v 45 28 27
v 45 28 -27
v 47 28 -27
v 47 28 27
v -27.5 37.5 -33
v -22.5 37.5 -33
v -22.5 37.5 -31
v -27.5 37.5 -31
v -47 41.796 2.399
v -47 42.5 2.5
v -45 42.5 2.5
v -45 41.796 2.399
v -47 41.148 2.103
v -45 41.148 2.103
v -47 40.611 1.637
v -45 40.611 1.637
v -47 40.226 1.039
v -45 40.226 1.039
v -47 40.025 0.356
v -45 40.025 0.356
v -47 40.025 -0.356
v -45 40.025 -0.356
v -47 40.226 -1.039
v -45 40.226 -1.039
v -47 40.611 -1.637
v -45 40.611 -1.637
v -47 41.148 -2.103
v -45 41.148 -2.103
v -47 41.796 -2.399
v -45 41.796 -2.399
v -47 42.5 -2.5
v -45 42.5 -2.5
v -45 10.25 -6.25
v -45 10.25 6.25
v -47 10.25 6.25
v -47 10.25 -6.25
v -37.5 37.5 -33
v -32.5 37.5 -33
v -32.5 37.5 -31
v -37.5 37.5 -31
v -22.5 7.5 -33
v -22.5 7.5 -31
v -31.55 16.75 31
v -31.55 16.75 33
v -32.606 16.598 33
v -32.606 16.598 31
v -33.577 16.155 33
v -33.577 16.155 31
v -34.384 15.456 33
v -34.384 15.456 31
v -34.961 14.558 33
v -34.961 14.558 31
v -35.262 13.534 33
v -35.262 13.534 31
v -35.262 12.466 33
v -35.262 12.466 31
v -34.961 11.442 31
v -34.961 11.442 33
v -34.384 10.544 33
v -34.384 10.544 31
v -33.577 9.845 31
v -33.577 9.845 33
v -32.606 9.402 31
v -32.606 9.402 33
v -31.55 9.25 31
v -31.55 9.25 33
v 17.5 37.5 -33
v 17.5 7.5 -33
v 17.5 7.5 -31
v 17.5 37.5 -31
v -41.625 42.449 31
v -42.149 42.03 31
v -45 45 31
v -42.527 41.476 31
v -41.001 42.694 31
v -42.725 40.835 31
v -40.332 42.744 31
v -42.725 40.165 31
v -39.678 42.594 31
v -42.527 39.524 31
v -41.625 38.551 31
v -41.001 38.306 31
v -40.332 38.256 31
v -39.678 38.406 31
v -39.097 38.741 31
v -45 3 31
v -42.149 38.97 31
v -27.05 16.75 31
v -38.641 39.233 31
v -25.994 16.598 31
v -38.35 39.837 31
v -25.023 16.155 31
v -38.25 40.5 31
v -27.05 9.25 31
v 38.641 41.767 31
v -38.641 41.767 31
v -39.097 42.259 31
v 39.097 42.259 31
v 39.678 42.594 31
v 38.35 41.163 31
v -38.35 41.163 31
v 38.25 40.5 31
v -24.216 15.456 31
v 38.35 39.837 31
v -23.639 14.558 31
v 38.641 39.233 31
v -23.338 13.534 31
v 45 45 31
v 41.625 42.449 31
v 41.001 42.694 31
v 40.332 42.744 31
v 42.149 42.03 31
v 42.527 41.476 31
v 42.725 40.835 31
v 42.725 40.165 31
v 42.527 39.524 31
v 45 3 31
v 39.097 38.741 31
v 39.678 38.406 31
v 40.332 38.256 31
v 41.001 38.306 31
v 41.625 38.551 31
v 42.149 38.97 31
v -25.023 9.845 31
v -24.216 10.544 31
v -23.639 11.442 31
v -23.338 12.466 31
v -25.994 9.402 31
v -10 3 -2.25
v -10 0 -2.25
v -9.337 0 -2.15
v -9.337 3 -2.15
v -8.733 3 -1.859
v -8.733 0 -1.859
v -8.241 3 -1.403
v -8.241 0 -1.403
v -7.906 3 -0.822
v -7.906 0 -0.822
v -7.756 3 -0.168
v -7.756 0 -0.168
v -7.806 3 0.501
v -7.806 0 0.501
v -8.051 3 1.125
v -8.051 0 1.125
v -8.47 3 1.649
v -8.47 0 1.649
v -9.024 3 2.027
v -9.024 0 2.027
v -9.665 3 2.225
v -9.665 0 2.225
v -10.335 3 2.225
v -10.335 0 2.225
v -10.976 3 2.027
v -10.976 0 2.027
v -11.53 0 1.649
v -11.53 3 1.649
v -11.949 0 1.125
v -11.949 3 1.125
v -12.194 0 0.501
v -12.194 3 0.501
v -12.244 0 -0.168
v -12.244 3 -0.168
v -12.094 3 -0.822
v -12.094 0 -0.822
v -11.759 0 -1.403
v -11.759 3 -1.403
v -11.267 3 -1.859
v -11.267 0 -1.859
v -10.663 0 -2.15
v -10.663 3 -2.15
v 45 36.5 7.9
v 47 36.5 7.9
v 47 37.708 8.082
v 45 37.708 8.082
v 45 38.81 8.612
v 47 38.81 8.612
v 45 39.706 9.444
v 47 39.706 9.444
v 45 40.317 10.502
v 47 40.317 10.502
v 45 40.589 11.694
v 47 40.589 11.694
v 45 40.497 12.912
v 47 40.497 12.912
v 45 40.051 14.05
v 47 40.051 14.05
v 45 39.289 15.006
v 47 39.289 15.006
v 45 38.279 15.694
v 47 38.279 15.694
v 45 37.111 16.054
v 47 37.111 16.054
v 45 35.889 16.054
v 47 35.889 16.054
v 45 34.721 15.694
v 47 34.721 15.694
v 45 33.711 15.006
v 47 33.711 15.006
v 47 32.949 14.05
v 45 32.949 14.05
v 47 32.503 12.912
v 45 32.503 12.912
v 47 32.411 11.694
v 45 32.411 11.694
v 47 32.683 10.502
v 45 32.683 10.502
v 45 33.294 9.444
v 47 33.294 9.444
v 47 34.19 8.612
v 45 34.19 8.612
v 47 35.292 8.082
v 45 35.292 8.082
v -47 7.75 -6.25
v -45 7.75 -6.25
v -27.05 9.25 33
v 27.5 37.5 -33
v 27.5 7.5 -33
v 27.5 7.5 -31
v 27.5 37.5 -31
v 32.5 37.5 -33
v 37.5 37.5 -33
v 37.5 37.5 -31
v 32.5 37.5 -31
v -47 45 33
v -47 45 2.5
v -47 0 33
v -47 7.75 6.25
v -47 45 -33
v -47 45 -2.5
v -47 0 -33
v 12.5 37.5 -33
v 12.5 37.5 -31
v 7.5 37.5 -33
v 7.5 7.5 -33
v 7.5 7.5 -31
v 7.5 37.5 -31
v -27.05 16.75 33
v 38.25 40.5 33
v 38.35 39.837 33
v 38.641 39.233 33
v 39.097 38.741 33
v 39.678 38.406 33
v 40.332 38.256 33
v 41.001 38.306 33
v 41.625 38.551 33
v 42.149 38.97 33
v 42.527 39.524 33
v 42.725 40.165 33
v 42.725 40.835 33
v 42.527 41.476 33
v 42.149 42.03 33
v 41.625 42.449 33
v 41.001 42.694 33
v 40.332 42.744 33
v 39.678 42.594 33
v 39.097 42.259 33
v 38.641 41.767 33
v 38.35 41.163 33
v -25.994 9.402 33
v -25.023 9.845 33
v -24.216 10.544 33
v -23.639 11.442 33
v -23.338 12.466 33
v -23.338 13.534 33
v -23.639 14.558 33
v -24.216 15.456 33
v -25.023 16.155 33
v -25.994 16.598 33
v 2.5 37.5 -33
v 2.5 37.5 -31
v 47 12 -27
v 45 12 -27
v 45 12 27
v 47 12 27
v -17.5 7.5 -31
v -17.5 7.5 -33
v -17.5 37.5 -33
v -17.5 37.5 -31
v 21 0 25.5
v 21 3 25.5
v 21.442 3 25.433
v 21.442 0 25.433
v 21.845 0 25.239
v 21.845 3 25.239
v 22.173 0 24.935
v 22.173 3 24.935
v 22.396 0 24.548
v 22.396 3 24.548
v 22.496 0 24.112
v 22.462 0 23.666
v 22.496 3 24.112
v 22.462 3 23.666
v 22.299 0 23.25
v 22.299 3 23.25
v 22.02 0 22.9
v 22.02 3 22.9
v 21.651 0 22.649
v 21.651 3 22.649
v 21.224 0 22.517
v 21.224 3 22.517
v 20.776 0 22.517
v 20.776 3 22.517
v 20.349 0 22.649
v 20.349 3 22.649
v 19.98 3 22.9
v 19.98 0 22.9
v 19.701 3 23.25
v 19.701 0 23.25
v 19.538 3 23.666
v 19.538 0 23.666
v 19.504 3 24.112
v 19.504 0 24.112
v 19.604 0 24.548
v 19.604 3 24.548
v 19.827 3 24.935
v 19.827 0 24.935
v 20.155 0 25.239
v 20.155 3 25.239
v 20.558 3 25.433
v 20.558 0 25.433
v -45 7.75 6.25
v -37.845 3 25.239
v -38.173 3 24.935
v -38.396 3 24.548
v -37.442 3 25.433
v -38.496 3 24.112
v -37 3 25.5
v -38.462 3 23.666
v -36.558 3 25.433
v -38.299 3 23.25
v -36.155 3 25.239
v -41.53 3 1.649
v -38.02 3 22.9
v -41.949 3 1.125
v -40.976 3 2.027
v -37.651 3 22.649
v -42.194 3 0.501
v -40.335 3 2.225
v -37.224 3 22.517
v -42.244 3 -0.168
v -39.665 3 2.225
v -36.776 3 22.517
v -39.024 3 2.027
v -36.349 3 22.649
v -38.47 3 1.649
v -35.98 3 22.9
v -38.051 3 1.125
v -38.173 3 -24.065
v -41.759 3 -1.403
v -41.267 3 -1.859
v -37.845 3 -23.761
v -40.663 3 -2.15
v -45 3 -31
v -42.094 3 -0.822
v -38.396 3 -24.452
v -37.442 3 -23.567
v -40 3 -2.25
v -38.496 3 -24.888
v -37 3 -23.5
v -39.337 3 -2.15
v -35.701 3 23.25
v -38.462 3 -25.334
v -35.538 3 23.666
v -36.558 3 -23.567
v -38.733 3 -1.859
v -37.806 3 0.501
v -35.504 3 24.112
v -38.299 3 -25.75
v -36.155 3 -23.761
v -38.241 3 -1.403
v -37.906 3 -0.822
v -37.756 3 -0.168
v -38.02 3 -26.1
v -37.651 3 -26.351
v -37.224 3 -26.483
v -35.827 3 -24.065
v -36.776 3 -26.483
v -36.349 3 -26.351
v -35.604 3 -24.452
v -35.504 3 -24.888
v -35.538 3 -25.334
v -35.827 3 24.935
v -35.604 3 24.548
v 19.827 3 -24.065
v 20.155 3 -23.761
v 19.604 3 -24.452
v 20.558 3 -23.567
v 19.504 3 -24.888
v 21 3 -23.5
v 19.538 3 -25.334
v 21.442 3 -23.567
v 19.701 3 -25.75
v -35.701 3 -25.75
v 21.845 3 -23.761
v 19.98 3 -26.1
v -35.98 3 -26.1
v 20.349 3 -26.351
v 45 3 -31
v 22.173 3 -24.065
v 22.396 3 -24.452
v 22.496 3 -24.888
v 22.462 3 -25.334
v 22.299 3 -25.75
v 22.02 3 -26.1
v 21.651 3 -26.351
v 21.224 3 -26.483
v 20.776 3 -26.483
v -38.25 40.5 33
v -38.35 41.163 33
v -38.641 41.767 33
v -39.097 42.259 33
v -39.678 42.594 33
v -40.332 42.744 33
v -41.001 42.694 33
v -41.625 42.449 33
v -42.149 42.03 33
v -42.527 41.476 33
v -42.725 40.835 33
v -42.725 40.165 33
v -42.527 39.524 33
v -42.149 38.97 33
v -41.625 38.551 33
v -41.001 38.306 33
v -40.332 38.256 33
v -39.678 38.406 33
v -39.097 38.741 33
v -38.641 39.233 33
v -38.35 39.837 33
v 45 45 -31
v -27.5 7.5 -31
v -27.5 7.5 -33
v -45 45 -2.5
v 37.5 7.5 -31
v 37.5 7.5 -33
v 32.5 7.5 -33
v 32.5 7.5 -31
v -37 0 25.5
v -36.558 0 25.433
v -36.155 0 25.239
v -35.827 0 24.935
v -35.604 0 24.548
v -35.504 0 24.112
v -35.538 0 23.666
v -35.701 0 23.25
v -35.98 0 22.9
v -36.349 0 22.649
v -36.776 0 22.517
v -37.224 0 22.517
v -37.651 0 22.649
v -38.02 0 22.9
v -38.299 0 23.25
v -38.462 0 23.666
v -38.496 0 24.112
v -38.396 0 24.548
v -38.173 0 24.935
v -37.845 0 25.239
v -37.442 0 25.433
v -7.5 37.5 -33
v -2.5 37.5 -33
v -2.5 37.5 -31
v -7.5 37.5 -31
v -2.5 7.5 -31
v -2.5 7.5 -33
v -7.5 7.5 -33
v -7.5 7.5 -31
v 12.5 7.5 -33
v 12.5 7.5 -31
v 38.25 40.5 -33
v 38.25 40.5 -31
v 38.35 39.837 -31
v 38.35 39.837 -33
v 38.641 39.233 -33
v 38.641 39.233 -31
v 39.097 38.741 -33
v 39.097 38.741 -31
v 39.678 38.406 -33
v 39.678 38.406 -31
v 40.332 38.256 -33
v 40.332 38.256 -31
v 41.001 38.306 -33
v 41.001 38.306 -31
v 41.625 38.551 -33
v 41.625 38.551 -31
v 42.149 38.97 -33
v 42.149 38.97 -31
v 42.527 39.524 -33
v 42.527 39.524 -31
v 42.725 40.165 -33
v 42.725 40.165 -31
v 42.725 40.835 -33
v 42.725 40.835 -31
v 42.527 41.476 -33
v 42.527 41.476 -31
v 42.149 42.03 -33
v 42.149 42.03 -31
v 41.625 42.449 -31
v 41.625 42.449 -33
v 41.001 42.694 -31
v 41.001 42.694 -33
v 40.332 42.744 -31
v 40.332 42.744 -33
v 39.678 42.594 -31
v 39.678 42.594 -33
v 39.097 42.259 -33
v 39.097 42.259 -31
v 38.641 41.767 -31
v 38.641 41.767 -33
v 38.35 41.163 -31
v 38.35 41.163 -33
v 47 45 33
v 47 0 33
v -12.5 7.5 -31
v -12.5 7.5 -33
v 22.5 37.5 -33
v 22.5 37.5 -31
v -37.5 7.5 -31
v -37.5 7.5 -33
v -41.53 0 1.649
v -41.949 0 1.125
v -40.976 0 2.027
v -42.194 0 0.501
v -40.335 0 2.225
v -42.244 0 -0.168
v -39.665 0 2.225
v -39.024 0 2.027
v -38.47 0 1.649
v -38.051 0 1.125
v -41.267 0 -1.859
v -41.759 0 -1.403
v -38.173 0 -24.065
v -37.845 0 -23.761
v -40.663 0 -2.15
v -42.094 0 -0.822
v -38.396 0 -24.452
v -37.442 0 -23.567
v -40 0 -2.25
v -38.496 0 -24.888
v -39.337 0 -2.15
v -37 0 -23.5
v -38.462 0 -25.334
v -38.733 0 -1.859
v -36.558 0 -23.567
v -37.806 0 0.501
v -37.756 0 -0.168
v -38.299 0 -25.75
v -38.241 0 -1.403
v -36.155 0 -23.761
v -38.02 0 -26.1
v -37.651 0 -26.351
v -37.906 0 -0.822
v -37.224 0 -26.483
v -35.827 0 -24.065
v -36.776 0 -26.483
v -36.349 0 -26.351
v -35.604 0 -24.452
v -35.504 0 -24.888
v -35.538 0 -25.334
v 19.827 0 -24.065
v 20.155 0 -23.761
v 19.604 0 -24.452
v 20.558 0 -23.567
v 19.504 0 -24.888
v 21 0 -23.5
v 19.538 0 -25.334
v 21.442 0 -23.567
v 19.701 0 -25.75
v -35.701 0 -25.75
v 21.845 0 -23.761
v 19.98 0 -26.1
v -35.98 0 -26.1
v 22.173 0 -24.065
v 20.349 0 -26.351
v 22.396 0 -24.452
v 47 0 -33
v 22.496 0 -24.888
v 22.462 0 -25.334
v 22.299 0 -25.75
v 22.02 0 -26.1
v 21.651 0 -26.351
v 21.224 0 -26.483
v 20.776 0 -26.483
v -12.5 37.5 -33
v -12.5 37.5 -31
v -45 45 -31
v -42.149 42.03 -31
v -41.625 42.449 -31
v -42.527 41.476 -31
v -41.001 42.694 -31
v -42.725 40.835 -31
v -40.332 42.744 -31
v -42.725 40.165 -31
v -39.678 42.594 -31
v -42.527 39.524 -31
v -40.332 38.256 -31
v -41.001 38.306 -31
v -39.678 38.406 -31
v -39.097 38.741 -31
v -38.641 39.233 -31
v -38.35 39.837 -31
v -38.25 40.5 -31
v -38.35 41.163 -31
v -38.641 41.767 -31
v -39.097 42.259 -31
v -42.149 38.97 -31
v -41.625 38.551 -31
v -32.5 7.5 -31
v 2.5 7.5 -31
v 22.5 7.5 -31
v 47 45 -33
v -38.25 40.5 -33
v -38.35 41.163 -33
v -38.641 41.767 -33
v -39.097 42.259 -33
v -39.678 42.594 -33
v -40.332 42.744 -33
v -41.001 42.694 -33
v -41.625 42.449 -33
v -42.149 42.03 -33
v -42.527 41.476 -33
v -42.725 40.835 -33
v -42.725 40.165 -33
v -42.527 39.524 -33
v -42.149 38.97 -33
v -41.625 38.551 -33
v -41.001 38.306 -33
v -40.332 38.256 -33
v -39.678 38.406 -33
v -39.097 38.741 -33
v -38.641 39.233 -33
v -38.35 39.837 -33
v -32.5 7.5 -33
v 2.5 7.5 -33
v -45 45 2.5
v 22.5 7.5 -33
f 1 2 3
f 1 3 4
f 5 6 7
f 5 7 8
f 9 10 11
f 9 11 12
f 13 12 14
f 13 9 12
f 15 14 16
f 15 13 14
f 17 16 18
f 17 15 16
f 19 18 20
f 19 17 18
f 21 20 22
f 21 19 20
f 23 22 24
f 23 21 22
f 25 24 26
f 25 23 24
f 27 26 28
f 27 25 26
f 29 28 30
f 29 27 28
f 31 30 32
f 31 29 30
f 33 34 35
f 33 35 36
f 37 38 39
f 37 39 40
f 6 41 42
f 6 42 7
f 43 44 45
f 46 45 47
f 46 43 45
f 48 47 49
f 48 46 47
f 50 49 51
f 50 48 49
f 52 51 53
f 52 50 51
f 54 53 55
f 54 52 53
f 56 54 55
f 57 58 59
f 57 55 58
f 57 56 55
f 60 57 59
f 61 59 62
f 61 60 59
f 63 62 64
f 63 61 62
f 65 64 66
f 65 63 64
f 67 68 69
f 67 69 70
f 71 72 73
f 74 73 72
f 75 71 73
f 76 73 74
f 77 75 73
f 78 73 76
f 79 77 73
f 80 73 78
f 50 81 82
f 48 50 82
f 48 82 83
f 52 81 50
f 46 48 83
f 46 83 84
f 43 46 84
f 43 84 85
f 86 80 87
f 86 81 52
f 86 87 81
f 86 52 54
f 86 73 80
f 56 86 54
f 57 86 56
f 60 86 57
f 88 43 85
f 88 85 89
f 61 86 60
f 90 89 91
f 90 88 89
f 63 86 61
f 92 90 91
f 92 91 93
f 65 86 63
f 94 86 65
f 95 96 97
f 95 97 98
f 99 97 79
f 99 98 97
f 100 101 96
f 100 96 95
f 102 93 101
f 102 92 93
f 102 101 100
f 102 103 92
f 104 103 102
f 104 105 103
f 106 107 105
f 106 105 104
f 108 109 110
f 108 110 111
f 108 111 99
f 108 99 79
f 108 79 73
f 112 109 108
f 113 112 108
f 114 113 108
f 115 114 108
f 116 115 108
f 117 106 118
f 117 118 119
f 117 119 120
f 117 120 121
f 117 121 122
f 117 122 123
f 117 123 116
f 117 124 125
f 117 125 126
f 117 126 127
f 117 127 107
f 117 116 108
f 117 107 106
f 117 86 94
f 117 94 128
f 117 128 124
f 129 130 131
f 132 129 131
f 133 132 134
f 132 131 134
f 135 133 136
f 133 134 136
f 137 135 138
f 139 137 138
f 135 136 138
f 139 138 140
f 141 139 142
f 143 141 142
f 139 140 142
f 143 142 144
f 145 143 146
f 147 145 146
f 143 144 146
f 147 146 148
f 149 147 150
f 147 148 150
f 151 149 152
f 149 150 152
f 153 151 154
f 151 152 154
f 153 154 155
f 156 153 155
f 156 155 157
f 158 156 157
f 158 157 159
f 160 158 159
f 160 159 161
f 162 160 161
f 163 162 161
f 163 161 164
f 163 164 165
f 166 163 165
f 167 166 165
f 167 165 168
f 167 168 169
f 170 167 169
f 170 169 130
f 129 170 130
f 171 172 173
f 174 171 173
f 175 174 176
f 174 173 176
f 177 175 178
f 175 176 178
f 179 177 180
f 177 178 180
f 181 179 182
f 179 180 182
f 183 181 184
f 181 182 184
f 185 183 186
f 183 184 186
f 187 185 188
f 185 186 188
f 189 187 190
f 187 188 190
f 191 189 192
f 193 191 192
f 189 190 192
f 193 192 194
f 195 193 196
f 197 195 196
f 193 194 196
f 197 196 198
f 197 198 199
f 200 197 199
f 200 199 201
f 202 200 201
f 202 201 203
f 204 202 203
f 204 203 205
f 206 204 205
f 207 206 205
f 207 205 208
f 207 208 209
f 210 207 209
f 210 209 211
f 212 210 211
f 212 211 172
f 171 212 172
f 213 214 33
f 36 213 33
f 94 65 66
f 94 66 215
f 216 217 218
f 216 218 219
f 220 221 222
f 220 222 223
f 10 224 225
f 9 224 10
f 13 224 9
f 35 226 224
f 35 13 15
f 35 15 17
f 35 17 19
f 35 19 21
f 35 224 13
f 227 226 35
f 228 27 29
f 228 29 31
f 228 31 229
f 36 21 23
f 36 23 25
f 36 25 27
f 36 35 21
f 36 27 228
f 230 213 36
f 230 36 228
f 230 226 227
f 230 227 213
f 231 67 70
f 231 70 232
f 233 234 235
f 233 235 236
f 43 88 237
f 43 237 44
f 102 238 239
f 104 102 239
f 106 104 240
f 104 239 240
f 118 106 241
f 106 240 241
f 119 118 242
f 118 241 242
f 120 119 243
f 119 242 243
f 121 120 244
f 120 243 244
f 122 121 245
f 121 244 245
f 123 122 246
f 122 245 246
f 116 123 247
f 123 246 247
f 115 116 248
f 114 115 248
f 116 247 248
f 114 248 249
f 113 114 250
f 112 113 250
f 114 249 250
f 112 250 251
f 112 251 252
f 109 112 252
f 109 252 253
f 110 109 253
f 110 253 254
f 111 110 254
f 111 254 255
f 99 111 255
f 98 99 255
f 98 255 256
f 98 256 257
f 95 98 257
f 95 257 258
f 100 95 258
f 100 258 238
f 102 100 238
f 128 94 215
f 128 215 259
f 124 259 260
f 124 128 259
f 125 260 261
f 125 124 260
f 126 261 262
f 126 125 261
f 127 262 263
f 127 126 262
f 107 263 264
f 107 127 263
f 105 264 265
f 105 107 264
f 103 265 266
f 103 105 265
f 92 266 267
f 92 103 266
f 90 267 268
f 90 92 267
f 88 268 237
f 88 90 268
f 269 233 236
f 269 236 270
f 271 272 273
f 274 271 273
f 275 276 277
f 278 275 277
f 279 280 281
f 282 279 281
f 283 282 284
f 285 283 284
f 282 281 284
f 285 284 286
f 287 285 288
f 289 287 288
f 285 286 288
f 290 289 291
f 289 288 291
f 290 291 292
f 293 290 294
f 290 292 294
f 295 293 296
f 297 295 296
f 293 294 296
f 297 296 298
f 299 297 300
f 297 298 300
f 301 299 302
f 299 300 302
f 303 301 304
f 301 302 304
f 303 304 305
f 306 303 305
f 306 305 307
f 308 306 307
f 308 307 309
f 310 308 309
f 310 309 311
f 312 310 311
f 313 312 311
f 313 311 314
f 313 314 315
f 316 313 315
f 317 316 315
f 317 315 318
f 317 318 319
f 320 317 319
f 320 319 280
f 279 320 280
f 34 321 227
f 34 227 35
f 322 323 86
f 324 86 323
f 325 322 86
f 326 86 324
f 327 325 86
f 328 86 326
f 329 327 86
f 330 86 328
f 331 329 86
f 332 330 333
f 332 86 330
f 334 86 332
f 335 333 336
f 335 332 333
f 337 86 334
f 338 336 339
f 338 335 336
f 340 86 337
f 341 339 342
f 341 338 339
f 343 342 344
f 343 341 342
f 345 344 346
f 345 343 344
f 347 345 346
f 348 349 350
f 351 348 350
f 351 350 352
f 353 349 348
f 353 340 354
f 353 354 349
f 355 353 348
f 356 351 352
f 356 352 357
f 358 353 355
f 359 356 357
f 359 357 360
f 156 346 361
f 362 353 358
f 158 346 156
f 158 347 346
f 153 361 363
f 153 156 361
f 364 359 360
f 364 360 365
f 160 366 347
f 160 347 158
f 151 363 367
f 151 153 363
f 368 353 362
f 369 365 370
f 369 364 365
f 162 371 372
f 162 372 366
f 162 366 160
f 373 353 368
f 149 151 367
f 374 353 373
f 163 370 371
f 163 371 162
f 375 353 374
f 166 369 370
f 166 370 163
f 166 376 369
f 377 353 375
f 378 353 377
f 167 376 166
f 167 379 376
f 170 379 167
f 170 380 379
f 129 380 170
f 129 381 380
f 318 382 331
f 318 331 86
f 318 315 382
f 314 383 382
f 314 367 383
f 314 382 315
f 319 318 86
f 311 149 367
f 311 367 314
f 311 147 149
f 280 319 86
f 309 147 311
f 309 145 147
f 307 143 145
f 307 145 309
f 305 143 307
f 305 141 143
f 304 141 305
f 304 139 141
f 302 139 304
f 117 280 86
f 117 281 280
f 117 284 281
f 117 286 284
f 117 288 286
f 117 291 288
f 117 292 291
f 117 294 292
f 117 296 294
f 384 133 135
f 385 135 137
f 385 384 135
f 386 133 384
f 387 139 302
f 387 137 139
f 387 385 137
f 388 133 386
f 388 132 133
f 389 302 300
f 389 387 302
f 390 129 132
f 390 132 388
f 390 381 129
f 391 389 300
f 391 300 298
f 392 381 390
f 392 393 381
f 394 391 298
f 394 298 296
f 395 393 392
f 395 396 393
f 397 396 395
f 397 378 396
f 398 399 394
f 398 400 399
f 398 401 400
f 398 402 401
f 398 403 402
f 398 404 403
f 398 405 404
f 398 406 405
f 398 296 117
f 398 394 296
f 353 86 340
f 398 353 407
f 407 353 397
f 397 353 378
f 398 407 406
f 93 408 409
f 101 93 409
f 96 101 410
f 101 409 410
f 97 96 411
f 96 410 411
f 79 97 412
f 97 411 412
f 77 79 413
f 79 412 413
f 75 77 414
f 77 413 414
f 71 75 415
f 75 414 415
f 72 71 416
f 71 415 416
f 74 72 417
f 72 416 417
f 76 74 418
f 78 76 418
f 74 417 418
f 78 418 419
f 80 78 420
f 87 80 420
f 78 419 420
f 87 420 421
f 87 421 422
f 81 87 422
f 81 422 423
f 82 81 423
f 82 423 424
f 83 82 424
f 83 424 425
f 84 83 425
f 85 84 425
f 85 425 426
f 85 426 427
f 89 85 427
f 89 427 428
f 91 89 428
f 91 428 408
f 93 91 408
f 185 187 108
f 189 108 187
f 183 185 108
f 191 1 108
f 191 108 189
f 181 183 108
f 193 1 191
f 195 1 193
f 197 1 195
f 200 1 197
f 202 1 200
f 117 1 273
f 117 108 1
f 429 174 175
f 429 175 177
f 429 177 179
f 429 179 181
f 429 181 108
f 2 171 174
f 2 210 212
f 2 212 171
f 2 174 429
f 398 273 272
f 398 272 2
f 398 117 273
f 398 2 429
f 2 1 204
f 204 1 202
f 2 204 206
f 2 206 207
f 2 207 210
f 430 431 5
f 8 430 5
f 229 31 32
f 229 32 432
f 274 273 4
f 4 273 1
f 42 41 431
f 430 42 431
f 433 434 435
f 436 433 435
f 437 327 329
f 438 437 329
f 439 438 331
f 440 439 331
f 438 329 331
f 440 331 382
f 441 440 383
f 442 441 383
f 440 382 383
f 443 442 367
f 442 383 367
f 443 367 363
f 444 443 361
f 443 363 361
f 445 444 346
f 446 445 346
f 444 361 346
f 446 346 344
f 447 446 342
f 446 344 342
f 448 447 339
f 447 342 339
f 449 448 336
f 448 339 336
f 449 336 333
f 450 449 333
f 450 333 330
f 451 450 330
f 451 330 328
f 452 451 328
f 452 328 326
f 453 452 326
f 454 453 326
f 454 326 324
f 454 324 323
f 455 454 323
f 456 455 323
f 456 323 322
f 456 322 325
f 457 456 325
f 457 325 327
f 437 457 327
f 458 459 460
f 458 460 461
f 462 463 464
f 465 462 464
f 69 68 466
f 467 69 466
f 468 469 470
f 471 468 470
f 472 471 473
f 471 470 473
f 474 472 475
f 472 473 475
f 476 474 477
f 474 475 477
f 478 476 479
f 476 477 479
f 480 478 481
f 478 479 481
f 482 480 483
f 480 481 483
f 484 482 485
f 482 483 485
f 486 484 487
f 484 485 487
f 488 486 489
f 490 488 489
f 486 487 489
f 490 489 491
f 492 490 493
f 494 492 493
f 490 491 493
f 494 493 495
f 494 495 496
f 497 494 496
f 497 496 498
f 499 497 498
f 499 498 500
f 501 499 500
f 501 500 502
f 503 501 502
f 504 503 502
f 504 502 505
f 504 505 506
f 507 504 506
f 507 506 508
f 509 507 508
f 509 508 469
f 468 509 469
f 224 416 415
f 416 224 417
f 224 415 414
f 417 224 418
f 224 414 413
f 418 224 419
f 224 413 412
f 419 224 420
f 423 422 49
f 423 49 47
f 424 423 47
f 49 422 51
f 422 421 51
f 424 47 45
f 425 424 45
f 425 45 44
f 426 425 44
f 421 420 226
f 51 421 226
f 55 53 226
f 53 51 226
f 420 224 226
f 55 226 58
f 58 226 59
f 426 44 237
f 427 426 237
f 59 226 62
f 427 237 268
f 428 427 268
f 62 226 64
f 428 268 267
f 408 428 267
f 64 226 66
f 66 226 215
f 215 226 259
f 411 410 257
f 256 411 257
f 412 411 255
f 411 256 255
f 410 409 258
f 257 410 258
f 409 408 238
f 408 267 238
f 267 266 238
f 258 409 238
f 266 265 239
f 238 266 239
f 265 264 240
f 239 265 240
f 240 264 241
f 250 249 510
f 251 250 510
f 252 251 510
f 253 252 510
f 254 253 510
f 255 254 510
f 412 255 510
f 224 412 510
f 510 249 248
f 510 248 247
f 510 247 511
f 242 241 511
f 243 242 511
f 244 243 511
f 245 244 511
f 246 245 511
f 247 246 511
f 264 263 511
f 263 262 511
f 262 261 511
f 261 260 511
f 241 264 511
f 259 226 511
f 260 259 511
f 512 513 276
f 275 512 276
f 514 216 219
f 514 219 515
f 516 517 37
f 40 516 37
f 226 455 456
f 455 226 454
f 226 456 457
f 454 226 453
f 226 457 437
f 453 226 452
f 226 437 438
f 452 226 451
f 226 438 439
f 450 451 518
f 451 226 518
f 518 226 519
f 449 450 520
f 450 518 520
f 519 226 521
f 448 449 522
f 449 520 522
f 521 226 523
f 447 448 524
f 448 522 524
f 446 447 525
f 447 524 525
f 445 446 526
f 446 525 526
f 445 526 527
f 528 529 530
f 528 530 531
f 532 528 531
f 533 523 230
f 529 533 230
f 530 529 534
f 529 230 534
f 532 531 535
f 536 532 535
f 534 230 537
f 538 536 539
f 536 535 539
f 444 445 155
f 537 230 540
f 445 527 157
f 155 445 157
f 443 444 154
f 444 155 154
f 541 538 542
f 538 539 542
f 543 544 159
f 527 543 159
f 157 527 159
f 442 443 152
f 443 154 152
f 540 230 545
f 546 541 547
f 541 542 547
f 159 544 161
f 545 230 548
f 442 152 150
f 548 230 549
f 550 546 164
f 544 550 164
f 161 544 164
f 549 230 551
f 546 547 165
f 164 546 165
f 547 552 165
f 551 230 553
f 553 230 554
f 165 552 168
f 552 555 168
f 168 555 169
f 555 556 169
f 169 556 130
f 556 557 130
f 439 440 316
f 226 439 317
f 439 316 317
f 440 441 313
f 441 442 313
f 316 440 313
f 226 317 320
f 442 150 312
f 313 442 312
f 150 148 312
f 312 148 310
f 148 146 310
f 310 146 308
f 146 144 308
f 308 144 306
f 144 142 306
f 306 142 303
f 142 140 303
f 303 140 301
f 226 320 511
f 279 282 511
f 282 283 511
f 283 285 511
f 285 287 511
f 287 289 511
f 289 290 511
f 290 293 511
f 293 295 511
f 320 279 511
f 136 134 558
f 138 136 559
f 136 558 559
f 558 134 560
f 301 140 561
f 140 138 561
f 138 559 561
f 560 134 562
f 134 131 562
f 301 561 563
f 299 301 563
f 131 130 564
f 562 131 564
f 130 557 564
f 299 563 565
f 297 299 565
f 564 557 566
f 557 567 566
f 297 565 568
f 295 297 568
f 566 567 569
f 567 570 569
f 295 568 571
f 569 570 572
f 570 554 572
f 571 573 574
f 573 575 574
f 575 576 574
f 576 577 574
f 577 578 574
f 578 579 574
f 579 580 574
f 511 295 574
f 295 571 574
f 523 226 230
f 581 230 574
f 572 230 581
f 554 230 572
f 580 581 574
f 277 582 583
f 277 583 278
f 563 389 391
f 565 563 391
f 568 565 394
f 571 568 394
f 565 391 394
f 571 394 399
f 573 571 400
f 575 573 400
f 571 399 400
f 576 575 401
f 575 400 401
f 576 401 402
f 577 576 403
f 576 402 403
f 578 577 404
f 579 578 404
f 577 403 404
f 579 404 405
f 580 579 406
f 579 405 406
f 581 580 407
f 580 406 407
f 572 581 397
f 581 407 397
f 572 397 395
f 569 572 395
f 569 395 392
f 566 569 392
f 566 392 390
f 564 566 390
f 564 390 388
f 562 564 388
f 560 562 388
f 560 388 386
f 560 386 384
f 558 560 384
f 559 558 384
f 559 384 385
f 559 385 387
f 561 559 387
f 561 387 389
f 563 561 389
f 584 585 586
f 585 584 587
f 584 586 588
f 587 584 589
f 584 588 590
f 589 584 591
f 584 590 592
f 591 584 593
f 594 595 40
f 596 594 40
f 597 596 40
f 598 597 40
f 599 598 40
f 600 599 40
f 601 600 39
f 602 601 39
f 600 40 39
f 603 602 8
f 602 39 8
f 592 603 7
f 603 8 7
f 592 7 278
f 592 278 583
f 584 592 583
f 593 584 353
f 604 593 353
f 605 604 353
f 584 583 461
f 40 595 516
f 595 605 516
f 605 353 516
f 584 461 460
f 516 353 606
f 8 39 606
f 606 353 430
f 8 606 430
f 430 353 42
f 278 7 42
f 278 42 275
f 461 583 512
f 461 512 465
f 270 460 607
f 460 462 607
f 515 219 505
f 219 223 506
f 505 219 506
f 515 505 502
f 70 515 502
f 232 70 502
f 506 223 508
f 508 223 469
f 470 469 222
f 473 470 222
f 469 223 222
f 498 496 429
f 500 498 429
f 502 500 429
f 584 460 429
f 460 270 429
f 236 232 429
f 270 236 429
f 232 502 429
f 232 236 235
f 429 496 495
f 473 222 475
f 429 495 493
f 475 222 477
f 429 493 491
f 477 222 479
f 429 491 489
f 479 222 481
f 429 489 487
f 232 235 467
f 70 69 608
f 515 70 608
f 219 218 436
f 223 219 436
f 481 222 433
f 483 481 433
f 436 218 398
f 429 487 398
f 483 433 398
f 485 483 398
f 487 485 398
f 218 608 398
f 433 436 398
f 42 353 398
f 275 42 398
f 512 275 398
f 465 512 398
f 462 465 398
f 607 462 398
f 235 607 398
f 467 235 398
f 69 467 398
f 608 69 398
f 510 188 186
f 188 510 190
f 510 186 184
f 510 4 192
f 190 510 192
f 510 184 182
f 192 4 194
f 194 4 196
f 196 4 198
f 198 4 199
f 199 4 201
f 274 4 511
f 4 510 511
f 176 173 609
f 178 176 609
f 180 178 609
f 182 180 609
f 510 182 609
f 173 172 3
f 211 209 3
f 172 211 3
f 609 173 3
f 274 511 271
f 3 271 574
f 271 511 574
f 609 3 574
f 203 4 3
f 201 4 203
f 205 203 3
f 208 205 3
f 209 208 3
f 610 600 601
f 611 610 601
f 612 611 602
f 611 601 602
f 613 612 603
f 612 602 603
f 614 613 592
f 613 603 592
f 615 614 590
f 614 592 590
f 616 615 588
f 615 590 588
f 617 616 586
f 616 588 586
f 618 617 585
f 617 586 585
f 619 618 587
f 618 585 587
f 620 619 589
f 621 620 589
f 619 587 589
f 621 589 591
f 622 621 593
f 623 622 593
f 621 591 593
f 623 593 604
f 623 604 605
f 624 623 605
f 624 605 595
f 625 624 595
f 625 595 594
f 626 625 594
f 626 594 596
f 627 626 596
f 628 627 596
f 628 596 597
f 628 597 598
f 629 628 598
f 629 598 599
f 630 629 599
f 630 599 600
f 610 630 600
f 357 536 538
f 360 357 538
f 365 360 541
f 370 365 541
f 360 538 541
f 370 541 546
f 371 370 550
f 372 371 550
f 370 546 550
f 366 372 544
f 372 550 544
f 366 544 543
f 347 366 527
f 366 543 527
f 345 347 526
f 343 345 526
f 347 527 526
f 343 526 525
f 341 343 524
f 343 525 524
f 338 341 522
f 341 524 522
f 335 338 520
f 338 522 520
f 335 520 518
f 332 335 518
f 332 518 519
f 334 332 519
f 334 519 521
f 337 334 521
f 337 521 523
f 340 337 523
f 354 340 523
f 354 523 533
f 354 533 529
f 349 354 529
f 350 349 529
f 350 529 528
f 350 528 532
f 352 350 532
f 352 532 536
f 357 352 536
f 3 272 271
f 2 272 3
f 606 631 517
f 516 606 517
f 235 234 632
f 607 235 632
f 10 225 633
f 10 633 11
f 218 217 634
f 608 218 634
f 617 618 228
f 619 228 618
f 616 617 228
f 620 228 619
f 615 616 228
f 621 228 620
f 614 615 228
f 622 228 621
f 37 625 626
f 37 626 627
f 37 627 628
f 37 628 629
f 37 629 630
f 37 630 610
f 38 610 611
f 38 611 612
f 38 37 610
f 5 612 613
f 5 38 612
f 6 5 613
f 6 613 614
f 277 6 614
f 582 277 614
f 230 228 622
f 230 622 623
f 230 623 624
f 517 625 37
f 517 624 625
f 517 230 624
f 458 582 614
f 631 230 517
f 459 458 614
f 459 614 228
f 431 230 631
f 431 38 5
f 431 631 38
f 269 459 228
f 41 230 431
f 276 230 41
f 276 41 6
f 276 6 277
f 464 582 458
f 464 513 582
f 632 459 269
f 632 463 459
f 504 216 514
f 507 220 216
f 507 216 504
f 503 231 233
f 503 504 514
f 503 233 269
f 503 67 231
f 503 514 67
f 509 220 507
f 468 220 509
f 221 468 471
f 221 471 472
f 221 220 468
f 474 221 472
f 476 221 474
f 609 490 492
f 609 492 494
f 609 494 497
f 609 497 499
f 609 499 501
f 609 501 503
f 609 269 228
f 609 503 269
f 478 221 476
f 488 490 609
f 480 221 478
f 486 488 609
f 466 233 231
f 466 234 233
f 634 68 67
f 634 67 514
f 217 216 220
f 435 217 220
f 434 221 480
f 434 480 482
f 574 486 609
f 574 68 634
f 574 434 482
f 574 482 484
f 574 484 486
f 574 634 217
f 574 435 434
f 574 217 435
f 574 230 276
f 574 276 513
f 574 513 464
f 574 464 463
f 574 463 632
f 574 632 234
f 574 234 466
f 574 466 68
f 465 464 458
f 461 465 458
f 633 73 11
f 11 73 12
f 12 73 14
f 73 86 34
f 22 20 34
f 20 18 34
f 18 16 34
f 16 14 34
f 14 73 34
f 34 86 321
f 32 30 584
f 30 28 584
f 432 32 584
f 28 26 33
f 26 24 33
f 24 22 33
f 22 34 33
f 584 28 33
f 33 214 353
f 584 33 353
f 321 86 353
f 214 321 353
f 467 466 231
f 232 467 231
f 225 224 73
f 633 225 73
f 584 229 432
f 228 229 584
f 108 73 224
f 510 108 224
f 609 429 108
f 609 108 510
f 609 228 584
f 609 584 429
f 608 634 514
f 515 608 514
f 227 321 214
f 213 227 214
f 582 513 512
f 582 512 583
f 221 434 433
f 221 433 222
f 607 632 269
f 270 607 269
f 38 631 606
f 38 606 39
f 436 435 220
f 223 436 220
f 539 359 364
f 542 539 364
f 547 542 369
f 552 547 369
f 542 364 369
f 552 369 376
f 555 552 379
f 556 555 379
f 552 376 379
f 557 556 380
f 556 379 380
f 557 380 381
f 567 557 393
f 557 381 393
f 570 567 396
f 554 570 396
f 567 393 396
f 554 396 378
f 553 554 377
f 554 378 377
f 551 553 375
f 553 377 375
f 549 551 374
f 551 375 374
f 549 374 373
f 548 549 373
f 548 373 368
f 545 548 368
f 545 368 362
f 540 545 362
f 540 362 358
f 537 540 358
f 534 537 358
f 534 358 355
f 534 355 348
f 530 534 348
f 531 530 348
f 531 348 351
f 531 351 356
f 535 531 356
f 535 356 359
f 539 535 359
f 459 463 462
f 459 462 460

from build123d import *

# Parameters (mm, degrees)
SKETCH1_W           = 90
SKETCH1_H           = 62
BOSS_EXTRUDE1_DEPTH = 3
CUT_EXTRUDE1_REACH  = 56.727
SKETCH2_R           = 1.5
SKETCH3_W           = 94
SKETCH3_H           = 66
SKETCH3_W_2         = 90
SKETCH3_H_2         = 62
BOSS_EXTRUDE2_DEPTH = 45
CUT_EXTRUDE2_REACH  = 109.601
SKETCH4_W           = 12.5
SKETCH4_H           = 2.5
CUT_EXTRUDE3_REACH  = 93.269
CUT_EXTRUDE4_REACH  = 109.601
SKETCH6_W           = 54
SKETCH6_H           = 16
CUT_EXTRUDE5_REACH  = 111.316
SKETCH7_R           = 4.1
SKETCH8_R           = 2.25
CUT_EXTRUDE6_DEPTH  = 93.682252886
CUT_EXTRUDE8_REACH  = 94.682
SKETCH10_W          = 5
SKETCH10_H          = 30
CUT_EXTRUDE9_REACH  = 111.316
CUT_EXTRUDE10_REACH = 74.959
SKETCH12_R          = 2.25


with BuildPart() as part:
    # Sketch1 → Boss-Extrude1 (new body)
    with BuildSketch(Plane(origin=(0, 0, 0), x_dir=(1, 0, 0), z_dir=(0, 1, 0))):
        Rectangle(SKETCH1_W, SKETCH1_H)
    extrude(amount=BOSS_EXTRUDE1_DEPTH)

    # Sketch2 → Cut-Extrude1 (cut, up to next)
    with BuildSketch(Plane(origin=(0, 3, 0), x_dir=(1, 0, 0), z_dir=(0, 1, 0)), mode=Mode.PRIVATE) as cut_extrude1_sk1:
        with Locations(Location((-37, -24, 0), (0, 0, 270))):
            Circle(SKETCH2_R)
    cut_extrude1_tool1 = extrude(cut_extrude1_sk1.sketch, amount=-CUT_EXTRUDE1_REACH, mode=Mode.PRIVATE) & part.part
    # Sketch2 → Cut-Extrude1 (cut, up to next)
    with BuildSketch(Plane(origin=(0, 3, 0), x_dir=(1, 0, 0), z_dir=(0, 1, 0)), mode=Mode.PRIVATE) as cut_extrude1_sk2:
        with Locations(Location((21, -24, 0), (0, 0, 270))):
            Circle(SKETCH2_R)
    cut_extrude1_tool2 = extrude(cut_extrude1_sk2.sketch, amount=-CUT_EXTRUDE1_REACH, mode=Mode.PRIVATE) & part.part
    # Sketch2 → Cut-Extrude1 (cut, up to next)
    with BuildSketch(Plane(origin=(0, 3, 0), x_dir=(1, 0, 0), z_dir=(0, 1, 0)), mode=Mode.PRIVATE) as cut_extrude1_sk3:
        with Locations(Location((21, 25, 0), (0, 0, 270))):
            Circle(SKETCH2_R)
    cut_extrude1_tool3 = extrude(cut_extrude1_sk3.sketch, amount=-CUT_EXTRUDE1_REACH, mode=Mode.PRIVATE) & part.part
    # Sketch2 → Cut-Extrude1 (cut, up to next)
    with BuildSketch(Plane(origin=(0, 3, 0), x_dir=(1, 0, 0), z_dir=(0, 1, 0)), mode=Mode.PRIVATE) as cut_extrude1_sk4:
        with Locations(Location((-37, 25, 0), (0, 0, 270))):
            Circle(SKETCH2_R)
    cut_extrude1_tool4 = extrude(cut_extrude1_sk4.sketch, amount=-CUT_EXTRUDE1_REACH, mode=Mode.PRIVATE) & part.part
    add(cut_extrude1_tool1.solids().sort_by_distance((-37, 3, 24))[0], mode=Mode.SUBTRACT)
    add(cut_extrude1_tool2.solids().sort_by_distance((21, 3, 24))[0], mode=Mode.SUBTRACT)
    add(cut_extrude1_tool3.solids().sort_by_distance((21, 3, -25))[0], mode=Mode.SUBTRACT)
    add(cut_extrude1_tool4.solids().sort_by_distance((-37, 3, -25))[0], mode=Mode.SUBTRACT)

    # Sketch3 → Boss-Extrude2 (add)
    with BuildSketch(Plane(origin=(0, 0, 0), x_dir=(1, 0, 0), z_dir=(0, 1, 0))):
        Rectangle(SKETCH3_W, SKETCH3_H)
        Rectangle(SKETCH3_W_2, SKETCH3_H_2, mode=Mode.SUBTRACT)
    extrude(amount=BOSS_EXTRUDE2_DEPTH)

    # Sketch4 → Cut-Extrude2 (cut, up to next)
    with BuildSketch(Plane(origin=(-45, 0, 0), x_dir=(0, 0, -1), z_dir=(1, 0, 0)), mode=Mode.PRIVATE) as cut_extrude2_sk1:
        with Locations((0, 9)):
            Rectangle(SKETCH4_W, SKETCH4_H)
    cut_extrude2_tool1 = extrude(cut_extrude2_sk1.sketch, amount=-CUT_EXTRUDE2_REACH, mode=Mode.PRIVATE) & part.part
    add(cut_extrude2_tool1.solids().sort_by_distance((-45, 9, 0))[0], mode=Mode.SUBTRACT)

    # Sketch5 → Cut-Extrude3 (cut, up to next)
    with BuildSketch(Plane(origin=(0, 0, 31), x_dir=(-1, 0, 0), z_dir=(0, 0, -1)), mode=Mode.PRIVATE) as cut_extrude3_sk1:
        with BuildLine():
            Line((31.55, 9.25), (27.05, 9.25))
            ThreePointArc((27.05, 9.25), (23.3, 13), (27.05, 16.75))
            Line((27.05, 16.75), (31.55, 16.75))
            ThreePointArc((31.55, 16.75), (35.3, 13), (31.55, 9.25))
        make_face()
    cut_extrude3_tool1 = extrude(cut_extrude3_sk1.sketch, amount=-CUT_EXTRUDE3_REACH, mode=Mode.PRIVATE) & part.part
    add(cut_extrude3_tool1.solids().sort_by_distance((-29.3, 13, 31))[0], mode=Mode.SUBTRACT)

    # Sketch6 → Cut-Extrude4 (cut, up to next)
    with BuildSketch(Plane.ZY.offset(-45), mode=Mode.PRIVATE) as cut_extrude4_sk1:
        with Locations((0, 20)):
            Rectangle(SKETCH6_W, SKETCH6_H)
    cut_extrude4_tool1 = extrude(cut_extrude4_sk1.sketch, amount=-CUT_EXTRUDE4_REACH, mode=Mode.PRIVATE) & part.part
    add(cut_extrude4_tool1.solids().sort_by_distance((45, 20, 0))[0], mode=Mode.SUBTRACT)

    # Sketch7 → Cut-Extrude5 (cut, up to next)
    with BuildSketch(Plane(origin=(47, 0, 0), x_dir=(0, 0, -1), z_dir=(1, 0, 0)), mode=Mode.PRIVATE) as cut_extrude5_sk1:
        with Locations((-12, 36.5)):
            Circle(SKETCH7_R)
    cut_extrude5_tool1 = extrude(cut_extrude5_sk1.sketch, amount=-CUT_EXTRUDE5_REACH, mode=Mode.PRIVATE) & part.part
    add(cut_extrude5_tool1.solids().sort_by_distance((47, 36.5, 12))[0], mode=Mode.SUBTRACT)

    # Sketch8 → Cut-Extrude6 (cut, through all)
    with BuildSketch(Plane.XY.offset(33)):
        with Locations((-40.5, 40.5)):
            Circle(SKETCH8_R)
        with Locations(Location((40.5, 40.5, 0), (0, 0, 180))):
            Circle(SKETCH8_R)
    extrude(amount=-CUT_EXTRUDE6_DEPTH, mode=Mode.SUBTRACT)

    # Sketch10 → Cut-Extrude8 (cut, up to next)
    with BuildSketch(Plane(origin=(0, 0, -33), x_dir=(-1, 0, 0), z_dir=(0, 0, -1)), mode=Mode.PRIVATE) as cut_extrude8_sk1:
        with Locations((15, 22.5)):
            Rectangle(SKETCH10_W, SKETCH10_H)
    cut_extrude8_tool1 = extrude(cut_extrude8_sk1.sketch, amount=-CUT_EXTRUDE8_REACH, mode=Mode.PRIVATE) & part.part
    # Sketch10 → Cut-Extrude8 (cut, up to next)
    with BuildSketch(Plane(origin=(0, 0, -33), x_dir=(-1, 0, 0), z_dir=(0, 0, -1)), mode=Mode.PRIVATE) as cut_extrude8_sk2:
        with Locations((5, 22.5)):
            Rectangle(SKETCH10_W, SKETCH10_H)
    cut_extrude8_tool2 = extrude(cut_extrude8_sk2.sketch, amount=-CUT_EXTRUDE8_REACH, mode=Mode.PRIVATE) & part.part
    # Sketch10 → Cut-Extrude8 (cut, up to next)
    with BuildSketch(Plane(origin=(0, 0, -33), x_dir=(-1, 0, 0), z_dir=(0, 0, -1)), mode=Mode.PRIVATE) as cut_extrude8_sk3:
        with Locations((25, 22.5)):
            Rectangle(SKETCH10_W, SKETCH10_H)
    cut_extrude8_tool3 = extrude(cut_extrude8_sk3.sketch, amount=-CUT_EXTRUDE8_REACH, mode=Mode.PRIVATE) & part.part
    # Sketch10 → Cut-Extrude8 (cut, up to next)
    with BuildSketch(Plane(origin=(0, 0, -33), x_dir=(-1, 0, 0), z_dir=(0, 0, -1)), mode=Mode.PRIVATE) as cut_extrude8_sk4:
        with Locations((35, 22.5)):
            Rectangle(SKETCH10_W, SKETCH10_H)
    cut_extrude8_tool4 = extrude(cut_extrude8_sk4.sketch, amount=-CUT_EXTRUDE8_REACH, mode=Mode.PRIVATE) & part.part
    # Sketch10 → Cut-Extrude8 (cut, up to next)
    with BuildSketch(Plane(origin=(0, 0, -33), x_dir=(-1, 0, 0), z_dir=(0, 0, -1)), mode=Mode.PRIVATE) as cut_extrude8_sk5:
        with Locations((-5, 22.5)):
            Rectangle(SKETCH10_W, SKETCH10_H)
    cut_extrude8_tool5 = extrude(cut_extrude8_sk5.sketch, amount=-CUT_EXTRUDE8_REACH, mode=Mode.PRIVATE) & part.part
    # Sketch10 → Cut-Extrude8 (cut, up to next)
    with BuildSketch(Plane(origin=(0, 0, -33), x_dir=(-1, 0, 0), z_dir=(0, 0, -1)), mode=Mode.PRIVATE) as cut_extrude8_sk6:
        with Locations((-15, 22.5)):
            Rectangle(SKETCH10_W, SKETCH10_H)
    cut_extrude8_tool6 = extrude(cut_extrude8_sk6.sketch, amount=-CUT_EXTRUDE8_REACH, mode=Mode.PRIVATE) & part.part
    # Sketch10 → Cut-Extrude8 (cut, up to next)
    with BuildSketch(Plane(origin=(0, 0, -33), x_dir=(-1, 0, 0), z_dir=(0, 0, -1)), mode=Mode.PRIVATE) as cut_extrude8_sk7:
        with Locations((-25, 22.5)):
            Rectangle(SKETCH10_W, SKETCH10_H)
    cut_extrude8_tool7 = extrude(cut_extrude8_sk7.sketch, amount=-CUT_EXTRUDE8_REACH, mode=Mode.PRIVATE) & part.part
    # Sketch10 → Cut-Extrude8 (cut, up to next)
    with BuildSketch(Plane(origin=(0, 0, -33), x_dir=(-1, 0, 0), z_dir=(0, 0, -1)), mode=Mode.PRIVATE) as cut_extrude8_sk8:
        with Locations((-35, 22.5)):
            Rectangle(SKETCH10_W, SKETCH10_H)
    cut_extrude8_tool8 = extrude(cut_extrude8_sk8.sketch, amount=-CUT_EXTRUDE8_REACH, mode=Mode.PRIVATE) & part.part
    add(cut_extrude8_tool1.solids().sort_by_distance((-15, 22.5, -33))[0], mode=Mode.SUBTRACT)
    add(cut_extrude8_tool2.solids().sort_by_distance((-5, 22.5, -33))[0], mode=Mode.SUBTRACT)
    add(cut_extrude8_tool3.solids().sort_by_distance((-25, 22.5, -33))[0], mode=Mode.SUBTRACT)
    add(cut_extrude8_tool4.solids().sort_by_distance((-35, 22.5, -33))[0], mode=Mode.SUBTRACT)
    add(cut_extrude8_tool5.solids().sort_by_distance((5, 22.5, -33))[0], mode=Mode.SUBTRACT)
    add(cut_extrude8_tool6.solids().sort_by_distance((15, 22.5, -33))[0], mode=Mode.SUBTRACT)
    add(cut_extrude8_tool7.solids().sort_by_distance((25, 22.5, -33))[0], mode=Mode.SUBTRACT)
    add(cut_extrude8_tool8.solids().sort_by_distance((35, 22.5, -33))[0], mode=Mode.SUBTRACT)

    # Sketch11 → Cut-Extrude9 (cut, up to next)
    with BuildSketch(Plane.ZY.offset(47), mode=Mode.PRIVATE) as cut_extrude9_sk1:
        with BuildLine():
            Line((2.5, 47.5), (2.5, 42.5))
            ThreePointArc((2.5, 42.5), (0, 40), (-2.5, 42.5))
            Line((-2.5, 42.5), (-2.5, 47.5))
            ThreePointArc((-2.5, 47.5), (0, 50), (2.5, 47.5))
        make_face()
    cut_extrude9_tool1 = extrude(cut_extrude9_sk1.sketch, amount=-CUT_EXTRUDE9_REACH, mode=Mode.PRIVATE) & part.part
    add(cut_extrude9_tool1.solids().sort_by_distance((-47, 45, 0))[0], mode=Mode.SUBTRACT)

    # Sketch12 → Cut-Extrude10 (cut, up to next)
    with BuildSketch(Plane.XZ, mode=Mode.PRIVATE) as cut_extrude10_sk1:
        with Locations(Location((-40, 0, 0), (0, 0, 270))):
            Circle(SKETCH12_R)
    cut_extrude10_tool1 = extrude(cut_extrude10_sk1.sketch, amount=-CUT_EXTRUDE10_REACH, mode=Mode.PRIVATE) & part.part
    # Sketch12 → Cut-Extrude10 (cut, up to next)
    with BuildSketch(Plane.XZ, mode=Mode.PRIVATE) as cut_extrude10_sk2:
        with Locations(Location((-10, 0, 0), (0, 0, 270))):
            Circle(SKETCH12_R)
    cut_extrude10_tool2 = extrude(cut_extrude10_sk2.sketch, amount=-CUT_EXTRUDE10_REACH, mode=Mode.PRIVATE) & part.part
    add(cut_extrude10_tool1.solids().sort_by_distance((-40, 0, 0))[0], mode=Mode.SUBTRACT)
    add(cut_extrude10_tool2.solids().sort_by_distance((-10, 0, 0))[0], mode=Mode.SUBTRACT)


solid = part.part
